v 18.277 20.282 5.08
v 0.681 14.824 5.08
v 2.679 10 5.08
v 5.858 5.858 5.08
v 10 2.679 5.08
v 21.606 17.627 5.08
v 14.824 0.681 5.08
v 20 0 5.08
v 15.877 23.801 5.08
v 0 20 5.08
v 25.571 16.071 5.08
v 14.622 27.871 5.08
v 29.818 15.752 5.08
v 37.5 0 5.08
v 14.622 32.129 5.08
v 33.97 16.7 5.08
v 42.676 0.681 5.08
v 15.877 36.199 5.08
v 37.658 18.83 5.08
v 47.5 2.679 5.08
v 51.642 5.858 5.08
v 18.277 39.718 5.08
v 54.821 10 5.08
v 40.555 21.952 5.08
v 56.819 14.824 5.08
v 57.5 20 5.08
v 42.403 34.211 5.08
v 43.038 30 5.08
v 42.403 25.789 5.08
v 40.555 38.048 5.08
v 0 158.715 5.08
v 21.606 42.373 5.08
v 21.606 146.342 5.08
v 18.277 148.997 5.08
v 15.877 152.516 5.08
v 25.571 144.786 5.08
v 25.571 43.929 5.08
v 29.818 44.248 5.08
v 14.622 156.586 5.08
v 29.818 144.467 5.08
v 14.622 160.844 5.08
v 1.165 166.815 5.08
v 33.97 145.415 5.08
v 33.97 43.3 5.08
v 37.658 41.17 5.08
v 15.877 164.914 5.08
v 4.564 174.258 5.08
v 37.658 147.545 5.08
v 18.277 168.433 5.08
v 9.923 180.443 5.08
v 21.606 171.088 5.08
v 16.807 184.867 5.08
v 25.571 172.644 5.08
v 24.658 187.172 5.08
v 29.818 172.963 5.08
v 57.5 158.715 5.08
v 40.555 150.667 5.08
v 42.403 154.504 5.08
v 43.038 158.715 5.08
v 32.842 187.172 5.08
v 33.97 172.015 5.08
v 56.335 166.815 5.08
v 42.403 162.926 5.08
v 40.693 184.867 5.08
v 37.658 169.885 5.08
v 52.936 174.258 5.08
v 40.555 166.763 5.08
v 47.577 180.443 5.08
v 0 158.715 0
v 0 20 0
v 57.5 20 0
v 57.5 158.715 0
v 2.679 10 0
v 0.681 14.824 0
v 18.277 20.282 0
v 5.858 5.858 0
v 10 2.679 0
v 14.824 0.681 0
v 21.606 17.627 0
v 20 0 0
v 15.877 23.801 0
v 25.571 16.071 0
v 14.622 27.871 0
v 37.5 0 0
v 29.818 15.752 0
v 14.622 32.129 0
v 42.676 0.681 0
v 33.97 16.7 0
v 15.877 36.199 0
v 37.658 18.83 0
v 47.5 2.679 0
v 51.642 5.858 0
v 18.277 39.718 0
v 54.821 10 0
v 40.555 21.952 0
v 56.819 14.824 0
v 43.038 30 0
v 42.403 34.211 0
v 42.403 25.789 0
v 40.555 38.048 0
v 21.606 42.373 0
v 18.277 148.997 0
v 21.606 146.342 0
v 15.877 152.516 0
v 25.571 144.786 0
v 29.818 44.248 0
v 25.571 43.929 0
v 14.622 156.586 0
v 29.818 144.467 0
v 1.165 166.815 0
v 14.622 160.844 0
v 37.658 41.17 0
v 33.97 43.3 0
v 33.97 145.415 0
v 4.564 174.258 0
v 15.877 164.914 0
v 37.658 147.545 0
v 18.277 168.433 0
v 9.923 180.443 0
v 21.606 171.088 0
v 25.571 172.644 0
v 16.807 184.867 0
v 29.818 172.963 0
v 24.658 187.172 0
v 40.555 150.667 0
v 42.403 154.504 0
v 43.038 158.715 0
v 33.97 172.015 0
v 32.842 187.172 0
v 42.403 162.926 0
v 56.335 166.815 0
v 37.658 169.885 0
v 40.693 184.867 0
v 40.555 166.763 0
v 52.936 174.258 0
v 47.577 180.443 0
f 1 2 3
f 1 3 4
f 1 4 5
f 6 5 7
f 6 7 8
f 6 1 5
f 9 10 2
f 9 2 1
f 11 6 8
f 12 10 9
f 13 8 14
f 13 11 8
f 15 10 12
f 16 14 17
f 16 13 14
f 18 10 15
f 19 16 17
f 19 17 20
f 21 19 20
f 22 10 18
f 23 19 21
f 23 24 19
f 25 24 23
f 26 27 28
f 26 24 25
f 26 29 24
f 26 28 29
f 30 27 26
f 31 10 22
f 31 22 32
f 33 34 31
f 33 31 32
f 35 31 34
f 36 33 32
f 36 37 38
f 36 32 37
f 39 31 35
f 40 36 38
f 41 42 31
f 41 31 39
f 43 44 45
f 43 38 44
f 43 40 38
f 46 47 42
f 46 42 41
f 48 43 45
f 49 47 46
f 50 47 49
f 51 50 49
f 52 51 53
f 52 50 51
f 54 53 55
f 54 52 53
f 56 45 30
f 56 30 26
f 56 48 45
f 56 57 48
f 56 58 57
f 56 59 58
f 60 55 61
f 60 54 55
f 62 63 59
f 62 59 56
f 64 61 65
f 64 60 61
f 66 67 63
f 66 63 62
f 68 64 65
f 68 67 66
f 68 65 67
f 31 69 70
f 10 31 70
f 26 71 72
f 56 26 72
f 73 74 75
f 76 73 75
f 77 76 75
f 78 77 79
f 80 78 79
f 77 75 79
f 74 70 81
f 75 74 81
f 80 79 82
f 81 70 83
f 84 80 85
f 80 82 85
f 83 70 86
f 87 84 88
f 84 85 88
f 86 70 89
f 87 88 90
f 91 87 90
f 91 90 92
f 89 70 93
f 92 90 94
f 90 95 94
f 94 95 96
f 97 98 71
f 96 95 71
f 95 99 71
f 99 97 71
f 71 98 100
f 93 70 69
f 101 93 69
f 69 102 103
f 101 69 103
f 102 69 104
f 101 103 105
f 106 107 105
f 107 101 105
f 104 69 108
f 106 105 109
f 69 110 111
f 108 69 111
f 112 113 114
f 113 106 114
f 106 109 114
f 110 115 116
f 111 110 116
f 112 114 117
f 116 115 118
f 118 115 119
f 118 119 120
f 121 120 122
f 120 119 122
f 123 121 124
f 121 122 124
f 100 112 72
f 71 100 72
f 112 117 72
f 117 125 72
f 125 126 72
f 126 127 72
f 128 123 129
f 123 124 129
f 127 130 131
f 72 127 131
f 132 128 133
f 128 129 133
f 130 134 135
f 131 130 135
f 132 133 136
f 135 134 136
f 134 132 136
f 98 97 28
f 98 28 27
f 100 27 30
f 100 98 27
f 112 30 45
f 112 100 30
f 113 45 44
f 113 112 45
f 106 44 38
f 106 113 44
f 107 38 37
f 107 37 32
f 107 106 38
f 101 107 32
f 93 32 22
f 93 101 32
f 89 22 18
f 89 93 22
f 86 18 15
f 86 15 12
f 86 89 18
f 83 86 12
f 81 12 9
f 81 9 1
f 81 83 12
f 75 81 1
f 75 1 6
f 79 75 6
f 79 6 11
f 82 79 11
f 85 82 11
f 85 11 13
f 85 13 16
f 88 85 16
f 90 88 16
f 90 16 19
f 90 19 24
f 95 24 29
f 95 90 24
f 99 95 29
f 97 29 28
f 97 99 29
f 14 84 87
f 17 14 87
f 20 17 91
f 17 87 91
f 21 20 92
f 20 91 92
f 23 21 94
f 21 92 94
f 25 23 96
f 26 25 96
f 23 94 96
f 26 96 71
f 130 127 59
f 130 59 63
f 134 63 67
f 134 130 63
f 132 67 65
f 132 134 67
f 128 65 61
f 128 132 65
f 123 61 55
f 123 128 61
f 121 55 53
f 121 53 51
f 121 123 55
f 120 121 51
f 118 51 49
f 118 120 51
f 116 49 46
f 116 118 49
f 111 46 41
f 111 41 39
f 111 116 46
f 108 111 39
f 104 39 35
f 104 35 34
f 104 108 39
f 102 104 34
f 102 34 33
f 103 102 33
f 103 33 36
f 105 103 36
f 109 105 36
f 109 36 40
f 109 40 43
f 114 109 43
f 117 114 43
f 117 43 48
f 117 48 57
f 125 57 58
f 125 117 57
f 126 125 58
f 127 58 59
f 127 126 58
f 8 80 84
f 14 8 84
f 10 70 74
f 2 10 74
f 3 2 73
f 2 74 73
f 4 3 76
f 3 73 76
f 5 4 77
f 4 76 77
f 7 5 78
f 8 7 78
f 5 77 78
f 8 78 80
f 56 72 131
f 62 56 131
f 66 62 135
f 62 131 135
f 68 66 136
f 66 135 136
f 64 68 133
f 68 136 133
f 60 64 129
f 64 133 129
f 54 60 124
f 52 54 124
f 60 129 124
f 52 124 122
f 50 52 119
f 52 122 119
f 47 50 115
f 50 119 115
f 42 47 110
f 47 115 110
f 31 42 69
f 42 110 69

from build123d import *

# Parameters (mm, degrees)
F0_R     = 14.2875
F1_DEPTH = 5.08


# Not quite as in the source:
# - a feature names something its author has since deleted; it is built from what else it names


with BuildPart() as f1:
    # F0 (on Top) → F1 (new body)
    with BuildSketch(Plane.XY):
        with BuildLine():
            ThreePointArc((0, 20), (5.8578643763, 5.8578643763), (20, 0))
            Line((20, 0), (37.5, 0))
            ThreePointArc((37.5, 0), (51.6421356237, 5.8578643763), (57.5, 20))
            Line((57.5, 20), (57.5, 158.715))
            ThreePointArc((57.5, 158.715), (28.75, 187.465), (0, 158.715))
            Line((0, 158.715), (0, 20))
        make_face()
        with Locations((28.75, 30)):
            Circle(F0_R, mode=Mode.SUBTRACT)
        with Locations((28.75, 158.715)):
            Circle(F0_R, mode=Mode.SUBTRACT)
    extrude(amount=F1_DEPTH)


solid = f1.part
